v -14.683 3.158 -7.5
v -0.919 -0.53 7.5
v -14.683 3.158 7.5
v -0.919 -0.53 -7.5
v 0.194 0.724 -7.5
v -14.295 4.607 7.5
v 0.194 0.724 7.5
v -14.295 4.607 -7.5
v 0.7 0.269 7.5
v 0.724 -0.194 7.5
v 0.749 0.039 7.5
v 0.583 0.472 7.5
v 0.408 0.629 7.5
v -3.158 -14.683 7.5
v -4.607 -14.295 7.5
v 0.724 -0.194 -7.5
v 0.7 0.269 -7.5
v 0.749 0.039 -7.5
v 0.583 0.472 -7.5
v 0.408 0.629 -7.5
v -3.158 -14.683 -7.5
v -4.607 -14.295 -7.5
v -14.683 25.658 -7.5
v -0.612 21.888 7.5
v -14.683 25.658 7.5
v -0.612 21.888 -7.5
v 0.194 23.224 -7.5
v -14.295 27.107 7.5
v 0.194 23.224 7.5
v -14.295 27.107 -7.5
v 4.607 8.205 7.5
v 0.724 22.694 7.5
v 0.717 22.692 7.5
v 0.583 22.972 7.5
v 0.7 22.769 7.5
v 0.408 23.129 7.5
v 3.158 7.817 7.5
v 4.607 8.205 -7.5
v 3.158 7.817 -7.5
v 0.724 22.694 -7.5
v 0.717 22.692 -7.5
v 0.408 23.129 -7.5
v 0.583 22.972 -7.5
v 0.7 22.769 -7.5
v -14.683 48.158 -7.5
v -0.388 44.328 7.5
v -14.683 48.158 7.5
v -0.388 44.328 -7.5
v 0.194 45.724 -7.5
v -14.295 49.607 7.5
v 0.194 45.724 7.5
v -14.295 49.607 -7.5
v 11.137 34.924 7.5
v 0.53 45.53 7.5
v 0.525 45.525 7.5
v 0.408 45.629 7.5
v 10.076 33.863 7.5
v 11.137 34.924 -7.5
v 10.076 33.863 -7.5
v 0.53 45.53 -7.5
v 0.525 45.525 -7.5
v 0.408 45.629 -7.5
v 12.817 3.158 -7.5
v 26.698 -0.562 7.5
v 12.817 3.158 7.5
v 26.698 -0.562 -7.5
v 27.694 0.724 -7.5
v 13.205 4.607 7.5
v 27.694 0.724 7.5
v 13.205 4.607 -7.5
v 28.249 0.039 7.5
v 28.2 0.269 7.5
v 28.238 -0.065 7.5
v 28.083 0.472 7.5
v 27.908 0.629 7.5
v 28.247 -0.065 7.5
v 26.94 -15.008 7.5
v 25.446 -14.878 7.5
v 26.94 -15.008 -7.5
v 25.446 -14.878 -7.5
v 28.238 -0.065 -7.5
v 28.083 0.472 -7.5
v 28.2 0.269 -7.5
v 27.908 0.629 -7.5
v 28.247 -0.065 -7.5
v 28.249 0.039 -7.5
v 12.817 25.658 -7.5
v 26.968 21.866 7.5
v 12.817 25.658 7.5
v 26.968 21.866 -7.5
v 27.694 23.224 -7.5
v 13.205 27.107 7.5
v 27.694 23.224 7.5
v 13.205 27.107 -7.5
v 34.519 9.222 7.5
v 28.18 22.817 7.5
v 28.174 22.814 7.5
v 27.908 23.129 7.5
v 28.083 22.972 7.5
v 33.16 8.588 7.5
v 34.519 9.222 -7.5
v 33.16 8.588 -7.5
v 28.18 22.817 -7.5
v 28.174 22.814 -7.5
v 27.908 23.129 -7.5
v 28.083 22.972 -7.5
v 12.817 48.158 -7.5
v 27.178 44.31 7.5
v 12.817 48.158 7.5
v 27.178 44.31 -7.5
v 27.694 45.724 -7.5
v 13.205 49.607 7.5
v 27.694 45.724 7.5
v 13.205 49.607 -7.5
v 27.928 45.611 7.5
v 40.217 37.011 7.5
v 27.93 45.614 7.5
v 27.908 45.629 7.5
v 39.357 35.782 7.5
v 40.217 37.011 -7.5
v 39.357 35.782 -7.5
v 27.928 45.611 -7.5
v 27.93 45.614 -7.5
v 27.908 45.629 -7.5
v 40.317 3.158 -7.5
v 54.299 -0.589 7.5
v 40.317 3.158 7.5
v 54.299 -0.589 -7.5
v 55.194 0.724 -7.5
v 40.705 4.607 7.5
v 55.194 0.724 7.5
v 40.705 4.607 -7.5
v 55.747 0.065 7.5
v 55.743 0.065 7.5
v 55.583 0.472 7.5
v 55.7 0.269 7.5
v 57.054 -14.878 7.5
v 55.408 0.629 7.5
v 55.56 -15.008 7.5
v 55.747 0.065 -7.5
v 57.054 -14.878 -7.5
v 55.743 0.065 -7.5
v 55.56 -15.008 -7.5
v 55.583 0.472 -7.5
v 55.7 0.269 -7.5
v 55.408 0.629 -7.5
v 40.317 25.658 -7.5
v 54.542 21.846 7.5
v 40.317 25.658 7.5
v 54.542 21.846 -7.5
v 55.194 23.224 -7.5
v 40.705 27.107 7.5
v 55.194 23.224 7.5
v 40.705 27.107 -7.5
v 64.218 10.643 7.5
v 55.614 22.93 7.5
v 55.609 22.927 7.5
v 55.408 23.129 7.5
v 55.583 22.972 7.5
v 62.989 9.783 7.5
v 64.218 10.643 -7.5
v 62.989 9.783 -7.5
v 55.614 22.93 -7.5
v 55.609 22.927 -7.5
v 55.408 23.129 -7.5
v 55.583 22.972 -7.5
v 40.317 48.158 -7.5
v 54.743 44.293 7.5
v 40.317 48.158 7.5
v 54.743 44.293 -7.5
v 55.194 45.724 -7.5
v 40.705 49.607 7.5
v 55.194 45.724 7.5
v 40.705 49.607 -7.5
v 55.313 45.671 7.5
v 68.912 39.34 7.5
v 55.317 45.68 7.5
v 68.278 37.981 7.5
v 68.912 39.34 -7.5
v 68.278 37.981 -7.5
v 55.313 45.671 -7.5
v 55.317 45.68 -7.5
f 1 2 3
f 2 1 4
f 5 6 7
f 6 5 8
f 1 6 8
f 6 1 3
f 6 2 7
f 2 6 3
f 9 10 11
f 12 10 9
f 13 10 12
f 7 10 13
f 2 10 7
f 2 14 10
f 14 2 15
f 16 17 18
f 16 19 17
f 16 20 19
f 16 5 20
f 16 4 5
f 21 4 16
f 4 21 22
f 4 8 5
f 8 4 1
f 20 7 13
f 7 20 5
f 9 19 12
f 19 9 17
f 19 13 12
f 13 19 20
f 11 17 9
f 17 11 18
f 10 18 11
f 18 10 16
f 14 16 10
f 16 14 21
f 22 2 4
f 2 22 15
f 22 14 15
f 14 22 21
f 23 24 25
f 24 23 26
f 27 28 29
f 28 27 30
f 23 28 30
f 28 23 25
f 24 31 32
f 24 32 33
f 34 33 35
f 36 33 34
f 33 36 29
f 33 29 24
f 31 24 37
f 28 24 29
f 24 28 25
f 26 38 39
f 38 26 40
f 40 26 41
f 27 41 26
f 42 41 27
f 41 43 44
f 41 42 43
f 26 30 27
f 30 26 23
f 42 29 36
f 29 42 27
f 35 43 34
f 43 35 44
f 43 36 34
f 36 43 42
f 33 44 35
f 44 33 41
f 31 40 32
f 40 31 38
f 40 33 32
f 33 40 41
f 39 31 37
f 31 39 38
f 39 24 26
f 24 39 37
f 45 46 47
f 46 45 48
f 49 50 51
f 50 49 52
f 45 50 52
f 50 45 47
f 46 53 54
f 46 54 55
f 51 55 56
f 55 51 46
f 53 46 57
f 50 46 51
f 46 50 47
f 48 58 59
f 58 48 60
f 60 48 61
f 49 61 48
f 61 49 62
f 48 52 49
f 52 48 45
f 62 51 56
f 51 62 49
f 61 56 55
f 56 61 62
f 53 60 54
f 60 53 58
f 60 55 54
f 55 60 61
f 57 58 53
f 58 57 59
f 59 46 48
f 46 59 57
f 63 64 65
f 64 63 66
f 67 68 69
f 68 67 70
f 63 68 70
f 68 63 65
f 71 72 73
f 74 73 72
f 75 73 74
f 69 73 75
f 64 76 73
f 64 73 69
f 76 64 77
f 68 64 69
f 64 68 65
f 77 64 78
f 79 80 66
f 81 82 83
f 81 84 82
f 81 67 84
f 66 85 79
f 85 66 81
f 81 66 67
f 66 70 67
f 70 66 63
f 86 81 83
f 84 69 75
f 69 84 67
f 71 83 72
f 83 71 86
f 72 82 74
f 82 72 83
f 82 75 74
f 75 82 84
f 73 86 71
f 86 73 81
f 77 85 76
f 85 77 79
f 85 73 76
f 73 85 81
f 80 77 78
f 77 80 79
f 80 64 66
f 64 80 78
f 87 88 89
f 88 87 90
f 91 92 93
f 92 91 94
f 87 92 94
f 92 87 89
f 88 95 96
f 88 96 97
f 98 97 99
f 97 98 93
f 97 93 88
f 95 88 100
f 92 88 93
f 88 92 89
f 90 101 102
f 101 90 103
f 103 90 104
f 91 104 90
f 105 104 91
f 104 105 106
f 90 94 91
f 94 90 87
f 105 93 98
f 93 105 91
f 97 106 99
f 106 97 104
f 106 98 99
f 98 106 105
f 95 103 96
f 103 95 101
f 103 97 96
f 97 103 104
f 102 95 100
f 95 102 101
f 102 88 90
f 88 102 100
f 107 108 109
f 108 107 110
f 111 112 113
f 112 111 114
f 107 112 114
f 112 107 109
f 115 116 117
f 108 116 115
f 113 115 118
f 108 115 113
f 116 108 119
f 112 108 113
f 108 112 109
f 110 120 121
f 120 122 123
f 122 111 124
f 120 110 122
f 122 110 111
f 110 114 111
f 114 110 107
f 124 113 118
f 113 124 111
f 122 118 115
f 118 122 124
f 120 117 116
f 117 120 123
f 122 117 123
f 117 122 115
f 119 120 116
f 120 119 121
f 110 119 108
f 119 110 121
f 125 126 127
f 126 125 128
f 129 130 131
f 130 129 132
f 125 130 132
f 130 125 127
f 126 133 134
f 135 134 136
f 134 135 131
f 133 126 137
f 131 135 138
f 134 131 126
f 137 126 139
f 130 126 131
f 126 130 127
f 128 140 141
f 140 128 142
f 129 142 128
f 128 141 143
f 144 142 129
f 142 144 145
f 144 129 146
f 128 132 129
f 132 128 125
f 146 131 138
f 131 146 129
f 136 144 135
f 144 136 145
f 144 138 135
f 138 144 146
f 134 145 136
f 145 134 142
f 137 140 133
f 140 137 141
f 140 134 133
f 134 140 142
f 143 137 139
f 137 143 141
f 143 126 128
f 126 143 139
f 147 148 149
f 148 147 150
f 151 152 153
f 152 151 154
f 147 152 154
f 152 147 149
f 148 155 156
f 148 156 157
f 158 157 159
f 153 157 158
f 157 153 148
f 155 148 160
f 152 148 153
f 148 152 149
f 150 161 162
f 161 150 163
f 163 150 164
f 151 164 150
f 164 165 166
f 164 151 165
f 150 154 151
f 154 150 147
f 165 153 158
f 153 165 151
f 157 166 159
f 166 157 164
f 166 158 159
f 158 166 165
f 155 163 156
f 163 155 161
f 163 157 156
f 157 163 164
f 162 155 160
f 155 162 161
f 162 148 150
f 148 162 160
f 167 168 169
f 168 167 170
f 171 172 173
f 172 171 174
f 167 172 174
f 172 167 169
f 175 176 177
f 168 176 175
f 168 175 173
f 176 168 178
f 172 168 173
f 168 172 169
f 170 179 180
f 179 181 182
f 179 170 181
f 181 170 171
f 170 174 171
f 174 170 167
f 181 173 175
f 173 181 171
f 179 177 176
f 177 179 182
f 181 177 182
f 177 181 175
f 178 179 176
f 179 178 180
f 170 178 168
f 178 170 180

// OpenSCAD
$fn = 20;

lado       = 15;
alto       = 1.5;
/// 

lado2       = lado / 2;
alto2       = alto / 2;
alto4       = alto / 4;

for (i = [0:2])
    for (j = [0:2])
        translate([i * (lado/2 + 20), j * (lado/2 + 15)]) 
            angulo(i * 10 + j * 30 + 90 );

module angulo(grados) {
    rotate([90, 0, -15]) {
        translate([-lado2, 0]) cube([lado, lado, alto], true);
        rotate([90]) cylinder(lado, d=alto, center=true);
        rotate([0, grados]) translate([-lado2, 0]) cube([lado, lado, alto], true);
    }
}
